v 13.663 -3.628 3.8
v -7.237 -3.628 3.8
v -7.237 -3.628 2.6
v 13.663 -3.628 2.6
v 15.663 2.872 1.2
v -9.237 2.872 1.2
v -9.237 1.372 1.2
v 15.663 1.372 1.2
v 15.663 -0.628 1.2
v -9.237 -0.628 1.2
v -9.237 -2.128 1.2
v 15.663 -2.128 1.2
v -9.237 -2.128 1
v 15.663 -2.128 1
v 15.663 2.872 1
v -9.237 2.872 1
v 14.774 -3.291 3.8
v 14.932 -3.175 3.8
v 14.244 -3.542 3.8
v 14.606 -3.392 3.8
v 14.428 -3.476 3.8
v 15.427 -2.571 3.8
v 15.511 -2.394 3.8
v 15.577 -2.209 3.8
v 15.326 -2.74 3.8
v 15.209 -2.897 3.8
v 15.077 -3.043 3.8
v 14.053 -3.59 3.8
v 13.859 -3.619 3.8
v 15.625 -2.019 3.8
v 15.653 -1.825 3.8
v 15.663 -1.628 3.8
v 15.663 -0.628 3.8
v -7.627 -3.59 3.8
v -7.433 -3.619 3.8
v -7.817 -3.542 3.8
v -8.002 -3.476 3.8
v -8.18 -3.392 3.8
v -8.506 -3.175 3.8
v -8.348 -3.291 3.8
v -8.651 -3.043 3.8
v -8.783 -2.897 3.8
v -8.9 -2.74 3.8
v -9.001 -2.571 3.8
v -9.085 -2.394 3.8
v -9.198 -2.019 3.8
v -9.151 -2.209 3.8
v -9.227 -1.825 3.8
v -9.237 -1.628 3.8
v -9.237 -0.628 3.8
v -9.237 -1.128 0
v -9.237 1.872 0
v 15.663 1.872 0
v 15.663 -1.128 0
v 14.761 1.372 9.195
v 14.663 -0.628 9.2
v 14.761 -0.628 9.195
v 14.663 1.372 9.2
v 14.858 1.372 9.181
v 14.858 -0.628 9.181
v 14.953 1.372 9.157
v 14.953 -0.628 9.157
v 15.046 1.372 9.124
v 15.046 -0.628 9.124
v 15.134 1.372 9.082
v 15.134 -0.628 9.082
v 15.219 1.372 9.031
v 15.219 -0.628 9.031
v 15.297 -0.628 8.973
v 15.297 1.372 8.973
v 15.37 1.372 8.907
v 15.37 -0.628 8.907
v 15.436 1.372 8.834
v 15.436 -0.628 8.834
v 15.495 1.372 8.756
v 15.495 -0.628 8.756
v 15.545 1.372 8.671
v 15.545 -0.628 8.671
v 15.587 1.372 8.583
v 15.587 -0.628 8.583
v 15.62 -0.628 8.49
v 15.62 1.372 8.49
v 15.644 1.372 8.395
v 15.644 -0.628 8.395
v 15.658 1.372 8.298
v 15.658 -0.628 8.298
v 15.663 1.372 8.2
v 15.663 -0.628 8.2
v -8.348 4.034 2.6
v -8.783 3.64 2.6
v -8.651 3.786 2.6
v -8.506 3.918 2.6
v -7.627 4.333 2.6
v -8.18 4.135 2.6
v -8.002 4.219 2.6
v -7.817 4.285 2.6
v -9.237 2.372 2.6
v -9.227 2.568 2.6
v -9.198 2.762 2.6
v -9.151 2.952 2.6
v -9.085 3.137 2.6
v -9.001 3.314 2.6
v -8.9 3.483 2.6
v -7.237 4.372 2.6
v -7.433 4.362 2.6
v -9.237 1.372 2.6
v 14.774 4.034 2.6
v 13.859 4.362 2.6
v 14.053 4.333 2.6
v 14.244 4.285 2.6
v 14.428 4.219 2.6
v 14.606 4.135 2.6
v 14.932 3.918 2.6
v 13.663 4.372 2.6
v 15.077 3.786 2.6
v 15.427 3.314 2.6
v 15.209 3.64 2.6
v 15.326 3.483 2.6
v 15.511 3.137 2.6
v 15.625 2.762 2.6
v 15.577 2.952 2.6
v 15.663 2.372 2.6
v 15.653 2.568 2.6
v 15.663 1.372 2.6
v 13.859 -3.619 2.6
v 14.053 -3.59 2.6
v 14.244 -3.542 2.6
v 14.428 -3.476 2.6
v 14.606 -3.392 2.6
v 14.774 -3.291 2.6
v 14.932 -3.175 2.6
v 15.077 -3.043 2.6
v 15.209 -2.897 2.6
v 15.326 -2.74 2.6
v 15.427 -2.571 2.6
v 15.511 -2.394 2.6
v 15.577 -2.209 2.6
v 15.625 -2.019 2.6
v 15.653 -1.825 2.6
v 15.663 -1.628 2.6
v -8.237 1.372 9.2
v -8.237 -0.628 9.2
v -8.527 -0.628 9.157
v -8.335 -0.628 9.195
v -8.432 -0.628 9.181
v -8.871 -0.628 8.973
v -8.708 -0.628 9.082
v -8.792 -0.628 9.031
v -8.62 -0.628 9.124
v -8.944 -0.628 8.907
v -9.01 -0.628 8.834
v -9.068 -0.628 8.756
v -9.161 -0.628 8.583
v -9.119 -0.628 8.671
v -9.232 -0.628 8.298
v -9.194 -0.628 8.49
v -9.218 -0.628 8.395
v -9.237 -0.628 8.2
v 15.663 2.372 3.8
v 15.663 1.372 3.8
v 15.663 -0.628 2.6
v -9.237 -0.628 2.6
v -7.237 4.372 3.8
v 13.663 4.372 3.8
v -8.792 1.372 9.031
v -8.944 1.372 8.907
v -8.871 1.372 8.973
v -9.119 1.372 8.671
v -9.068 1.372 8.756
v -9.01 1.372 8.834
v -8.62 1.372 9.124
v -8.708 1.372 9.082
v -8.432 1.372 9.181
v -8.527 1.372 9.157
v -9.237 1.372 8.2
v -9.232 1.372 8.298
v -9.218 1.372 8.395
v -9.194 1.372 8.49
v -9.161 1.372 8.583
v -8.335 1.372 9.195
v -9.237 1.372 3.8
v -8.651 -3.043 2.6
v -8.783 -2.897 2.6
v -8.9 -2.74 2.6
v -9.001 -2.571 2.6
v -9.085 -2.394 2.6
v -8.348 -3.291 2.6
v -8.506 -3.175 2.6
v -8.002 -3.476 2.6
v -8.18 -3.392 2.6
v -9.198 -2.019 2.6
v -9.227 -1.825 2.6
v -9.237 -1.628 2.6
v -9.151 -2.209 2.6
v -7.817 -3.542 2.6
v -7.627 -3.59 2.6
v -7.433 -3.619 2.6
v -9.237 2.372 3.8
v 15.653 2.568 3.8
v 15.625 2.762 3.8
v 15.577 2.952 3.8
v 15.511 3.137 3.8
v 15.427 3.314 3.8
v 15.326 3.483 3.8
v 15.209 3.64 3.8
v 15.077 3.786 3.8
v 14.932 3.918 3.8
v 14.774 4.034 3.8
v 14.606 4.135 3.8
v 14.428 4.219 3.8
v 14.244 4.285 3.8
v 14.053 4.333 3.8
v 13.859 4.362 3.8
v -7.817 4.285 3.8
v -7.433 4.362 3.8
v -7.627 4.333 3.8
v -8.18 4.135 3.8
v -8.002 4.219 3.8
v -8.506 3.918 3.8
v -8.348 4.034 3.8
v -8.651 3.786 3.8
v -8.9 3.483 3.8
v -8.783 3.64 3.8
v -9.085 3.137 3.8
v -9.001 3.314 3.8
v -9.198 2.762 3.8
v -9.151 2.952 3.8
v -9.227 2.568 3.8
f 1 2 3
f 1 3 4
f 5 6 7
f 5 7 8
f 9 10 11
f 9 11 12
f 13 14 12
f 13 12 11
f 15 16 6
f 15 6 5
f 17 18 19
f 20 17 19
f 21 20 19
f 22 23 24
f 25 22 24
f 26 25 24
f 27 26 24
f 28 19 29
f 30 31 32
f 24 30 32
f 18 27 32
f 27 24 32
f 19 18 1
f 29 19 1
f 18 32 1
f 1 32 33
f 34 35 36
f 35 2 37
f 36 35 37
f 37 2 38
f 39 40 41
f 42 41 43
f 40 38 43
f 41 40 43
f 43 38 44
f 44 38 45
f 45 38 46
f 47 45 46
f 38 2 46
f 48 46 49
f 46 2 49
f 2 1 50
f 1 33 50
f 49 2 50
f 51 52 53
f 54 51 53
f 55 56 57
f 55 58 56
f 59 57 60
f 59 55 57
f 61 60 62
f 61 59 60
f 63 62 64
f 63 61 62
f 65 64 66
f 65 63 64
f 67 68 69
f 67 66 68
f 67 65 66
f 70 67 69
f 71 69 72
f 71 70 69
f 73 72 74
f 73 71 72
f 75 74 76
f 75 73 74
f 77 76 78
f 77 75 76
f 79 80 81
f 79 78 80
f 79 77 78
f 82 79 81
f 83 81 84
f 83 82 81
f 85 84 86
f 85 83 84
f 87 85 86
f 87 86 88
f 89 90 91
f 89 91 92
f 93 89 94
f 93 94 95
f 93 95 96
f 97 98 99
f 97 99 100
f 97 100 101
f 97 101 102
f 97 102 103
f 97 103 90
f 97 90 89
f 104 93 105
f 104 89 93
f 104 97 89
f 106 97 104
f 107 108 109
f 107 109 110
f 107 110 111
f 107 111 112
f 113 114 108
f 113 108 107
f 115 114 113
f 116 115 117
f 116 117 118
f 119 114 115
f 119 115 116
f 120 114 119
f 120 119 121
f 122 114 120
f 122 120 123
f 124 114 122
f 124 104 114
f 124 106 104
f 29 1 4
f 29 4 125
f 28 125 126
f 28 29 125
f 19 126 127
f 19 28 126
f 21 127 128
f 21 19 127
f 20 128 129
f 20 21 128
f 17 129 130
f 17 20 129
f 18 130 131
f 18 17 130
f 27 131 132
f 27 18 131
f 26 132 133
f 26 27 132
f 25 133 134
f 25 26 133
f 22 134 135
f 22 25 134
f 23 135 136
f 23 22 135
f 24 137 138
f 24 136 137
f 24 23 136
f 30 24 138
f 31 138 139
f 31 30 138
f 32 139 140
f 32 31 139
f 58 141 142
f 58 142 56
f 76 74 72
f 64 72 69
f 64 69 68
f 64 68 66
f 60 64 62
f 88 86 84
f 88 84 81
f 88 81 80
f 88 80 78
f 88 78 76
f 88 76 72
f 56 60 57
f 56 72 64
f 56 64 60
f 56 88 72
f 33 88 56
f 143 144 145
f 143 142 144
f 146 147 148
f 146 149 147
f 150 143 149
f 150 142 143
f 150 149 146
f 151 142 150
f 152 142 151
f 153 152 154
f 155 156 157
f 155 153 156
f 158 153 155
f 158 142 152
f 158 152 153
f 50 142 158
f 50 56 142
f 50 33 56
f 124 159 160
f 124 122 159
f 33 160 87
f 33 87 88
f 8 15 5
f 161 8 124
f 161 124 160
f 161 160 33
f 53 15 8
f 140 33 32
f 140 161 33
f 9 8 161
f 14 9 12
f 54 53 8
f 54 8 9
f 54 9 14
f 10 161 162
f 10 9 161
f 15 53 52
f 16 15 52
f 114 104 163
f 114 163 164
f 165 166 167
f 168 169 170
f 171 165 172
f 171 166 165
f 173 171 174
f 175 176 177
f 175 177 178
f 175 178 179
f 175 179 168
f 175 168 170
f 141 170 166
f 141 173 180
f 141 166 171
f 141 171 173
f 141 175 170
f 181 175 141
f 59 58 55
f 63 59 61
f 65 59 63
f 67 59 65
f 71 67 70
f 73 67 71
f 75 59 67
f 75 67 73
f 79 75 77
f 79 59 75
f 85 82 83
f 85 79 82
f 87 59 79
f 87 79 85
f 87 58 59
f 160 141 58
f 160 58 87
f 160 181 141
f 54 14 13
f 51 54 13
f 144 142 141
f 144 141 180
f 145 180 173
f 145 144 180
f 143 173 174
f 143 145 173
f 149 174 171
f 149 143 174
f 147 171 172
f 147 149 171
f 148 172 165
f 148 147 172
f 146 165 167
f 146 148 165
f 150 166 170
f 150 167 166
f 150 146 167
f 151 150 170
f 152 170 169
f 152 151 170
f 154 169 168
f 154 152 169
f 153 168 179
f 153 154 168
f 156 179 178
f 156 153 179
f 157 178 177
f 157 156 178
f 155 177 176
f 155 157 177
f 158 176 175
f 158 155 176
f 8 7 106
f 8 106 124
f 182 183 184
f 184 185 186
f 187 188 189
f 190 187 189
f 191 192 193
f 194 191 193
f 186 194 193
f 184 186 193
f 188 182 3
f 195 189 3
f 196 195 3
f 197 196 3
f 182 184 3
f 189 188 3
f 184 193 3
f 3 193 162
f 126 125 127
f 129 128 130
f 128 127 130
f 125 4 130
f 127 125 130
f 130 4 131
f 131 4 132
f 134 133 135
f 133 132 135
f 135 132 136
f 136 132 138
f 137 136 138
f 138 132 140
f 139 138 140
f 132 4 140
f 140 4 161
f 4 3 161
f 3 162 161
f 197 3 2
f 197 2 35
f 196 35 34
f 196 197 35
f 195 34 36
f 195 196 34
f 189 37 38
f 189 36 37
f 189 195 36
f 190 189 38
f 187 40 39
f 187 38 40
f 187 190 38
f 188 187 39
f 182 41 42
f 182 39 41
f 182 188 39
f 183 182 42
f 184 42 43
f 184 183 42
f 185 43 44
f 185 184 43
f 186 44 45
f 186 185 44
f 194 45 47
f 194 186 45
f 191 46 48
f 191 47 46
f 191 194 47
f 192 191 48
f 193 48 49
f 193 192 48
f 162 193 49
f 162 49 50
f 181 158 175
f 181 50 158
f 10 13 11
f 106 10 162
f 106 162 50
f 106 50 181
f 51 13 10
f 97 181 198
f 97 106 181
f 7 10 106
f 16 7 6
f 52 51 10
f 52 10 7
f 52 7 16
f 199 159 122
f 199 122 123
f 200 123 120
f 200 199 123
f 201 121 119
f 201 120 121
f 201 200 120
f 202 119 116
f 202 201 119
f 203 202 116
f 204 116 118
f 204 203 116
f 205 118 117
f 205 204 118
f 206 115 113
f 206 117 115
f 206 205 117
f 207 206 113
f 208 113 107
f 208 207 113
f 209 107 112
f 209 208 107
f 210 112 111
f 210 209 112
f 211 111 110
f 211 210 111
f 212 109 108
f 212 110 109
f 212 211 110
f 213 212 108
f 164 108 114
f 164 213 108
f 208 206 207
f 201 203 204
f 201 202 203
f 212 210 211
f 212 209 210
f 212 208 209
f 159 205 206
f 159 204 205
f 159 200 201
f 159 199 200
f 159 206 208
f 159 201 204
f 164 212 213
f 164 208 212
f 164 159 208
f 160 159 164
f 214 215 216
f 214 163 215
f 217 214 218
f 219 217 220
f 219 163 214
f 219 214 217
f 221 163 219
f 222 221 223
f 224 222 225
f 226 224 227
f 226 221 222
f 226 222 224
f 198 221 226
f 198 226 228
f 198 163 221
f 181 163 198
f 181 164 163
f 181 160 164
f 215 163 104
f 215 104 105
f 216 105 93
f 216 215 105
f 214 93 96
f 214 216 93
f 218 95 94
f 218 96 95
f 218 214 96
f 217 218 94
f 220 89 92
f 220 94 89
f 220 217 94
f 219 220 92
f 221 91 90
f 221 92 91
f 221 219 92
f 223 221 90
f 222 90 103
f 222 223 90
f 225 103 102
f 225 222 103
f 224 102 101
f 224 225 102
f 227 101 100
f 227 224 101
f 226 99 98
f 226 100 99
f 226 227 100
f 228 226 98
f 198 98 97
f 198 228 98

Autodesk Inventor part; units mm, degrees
ref_plane "YZ Plane" through (0, 0, 0) normal (1, 0, 0) x (0, 1, 0)
ref_plane "XZ Plane" through (0, 0, 0) normal (0, 1, 0) x (-1, 0, 0)
ref_plane "XY Plane" through (0, 0, 0) normal (0, 0, 1) x (1, 0, 0)
sketch "Sketch1" plane through (0, 0, 0) normal (0, 0, 1) x (1, 0, 0)
  line L0 (-9.2369, 2.8715) -> (15.6631, 2.8715)
  line L1 (15.6631, 2.8715) -> (15.6631, -2.1285)
  line L2 (15.6631, -2.1285) -> (-9.2369, -2.1285)
  line L3 (-9.2369, -2.1285) -> (-9.2369, 2.8715)
  point P0 (0, 0)
  dimension "d0" = 24.9
  dimension "d1" = 5
extrude "Extrusion1" add sketch "Sketch1" along normal blind 1.2
sketch "Sketch2" plane through (0, 0, 1.2) normal (0, 0, 1) x (1, 0, 0)
  line L0 (-9.2369, 2.8715) -> (-9.2369, -2.1285) projected
  line L1 (15.6631, -2.1285) -> (15.6631, 2.8715) projected
  line L2 (-9.2369, 1.3715) -> (15.6631, 1.3715)
  line L3 (15.6631, 1.3715) -> (15.6631, -0.6285)
  line L4 (15.6631, -0.6285) -> (-9.2369, -0.6285)
  line L5 (-9.2369, -0.6285) -> (-9.2369, 1.3715)
  line L6 (15.6631, 2.8715) -> (-9.2369, 2.8715) projected
  point P0 (0, 0)
  point P1 (15.6631, 1.3715)
  dimension "d4" = 2
  dimension "d5" = 1.5
extrude "Extrusion2" add sketch "Sketch2" along normal blind 8 contours L2 L1 L4 L0
chamfer "Chamfer1" distance 1 angle 45 2 edges at (3.2131, 2.8715, 0) (3.2131, -2.1285, 0)
fillet "Fillet4" radius 1 2 edges at (-9.2369, 0.3715, 9.2) (15.6631, 0.3715, 9.2)
sketch "Sketch3" plane through (-9.2369, 1.3715, 1.2) normal (0, 1, 0) x (1, 0, 0)
  line L0 (0, 0) -> (0, -7) projected
  line L1 (24.9, 0) -> (24.9, -7) projected
  line L2 (0, -1.4) -> (24.9, -1.4)
  line L3 (24.9, -1.4) -> (24.9, -2.6)
  line L4 (24.9, -2.6) -> (0, -2.6)
  line L5 (0, -2.6) -> (0, -1.4)
  line L6 (24.9, 0) -> (0, 0) projected
  point P0 (9.2369, 1.2)
  point P1 (0, -2.6)
  dimension "d15" = 1.4
  dimension "d16" = 1.2
extrude "Extrusion3" add sketch "Sketch3" along normal blind 3 contours L2 L1 L4 L0
sketch "Sketch4" plane through (-9.2369, -0.6285, 1.2) normal (0, -1, 0) x (1, 0, 0)
  line L0 (24.9, 2.6) -> (0, 2.6) projected
  line L1 (0, 1.4) -> (24.9, 1.4) projected
  line L2 (24.9, 2.6) -> (0, 2.6)
  line L3 (0, 2.6) -> (0, 1.4)
  line L4 (0, 1.4) -> (24.9, 1.4)
  line L5 (24.9, 1.4) -> (24.9, 2.6)
  point P0 (9.2369, -1.2)
  point P1 (0, 2.6)
extrude "Extrusion4" add sketch "Sketch4" along normal blind 3
fillet "Fillet5" radius 2 4 edges at (-9.2369, 4.3715, 3.2) (-9.2369, -3.6285, 3.2) (15.6631, 4.3715, 3.2) (15.6631, -3.6285, 3.2)
properties part number "flag"
